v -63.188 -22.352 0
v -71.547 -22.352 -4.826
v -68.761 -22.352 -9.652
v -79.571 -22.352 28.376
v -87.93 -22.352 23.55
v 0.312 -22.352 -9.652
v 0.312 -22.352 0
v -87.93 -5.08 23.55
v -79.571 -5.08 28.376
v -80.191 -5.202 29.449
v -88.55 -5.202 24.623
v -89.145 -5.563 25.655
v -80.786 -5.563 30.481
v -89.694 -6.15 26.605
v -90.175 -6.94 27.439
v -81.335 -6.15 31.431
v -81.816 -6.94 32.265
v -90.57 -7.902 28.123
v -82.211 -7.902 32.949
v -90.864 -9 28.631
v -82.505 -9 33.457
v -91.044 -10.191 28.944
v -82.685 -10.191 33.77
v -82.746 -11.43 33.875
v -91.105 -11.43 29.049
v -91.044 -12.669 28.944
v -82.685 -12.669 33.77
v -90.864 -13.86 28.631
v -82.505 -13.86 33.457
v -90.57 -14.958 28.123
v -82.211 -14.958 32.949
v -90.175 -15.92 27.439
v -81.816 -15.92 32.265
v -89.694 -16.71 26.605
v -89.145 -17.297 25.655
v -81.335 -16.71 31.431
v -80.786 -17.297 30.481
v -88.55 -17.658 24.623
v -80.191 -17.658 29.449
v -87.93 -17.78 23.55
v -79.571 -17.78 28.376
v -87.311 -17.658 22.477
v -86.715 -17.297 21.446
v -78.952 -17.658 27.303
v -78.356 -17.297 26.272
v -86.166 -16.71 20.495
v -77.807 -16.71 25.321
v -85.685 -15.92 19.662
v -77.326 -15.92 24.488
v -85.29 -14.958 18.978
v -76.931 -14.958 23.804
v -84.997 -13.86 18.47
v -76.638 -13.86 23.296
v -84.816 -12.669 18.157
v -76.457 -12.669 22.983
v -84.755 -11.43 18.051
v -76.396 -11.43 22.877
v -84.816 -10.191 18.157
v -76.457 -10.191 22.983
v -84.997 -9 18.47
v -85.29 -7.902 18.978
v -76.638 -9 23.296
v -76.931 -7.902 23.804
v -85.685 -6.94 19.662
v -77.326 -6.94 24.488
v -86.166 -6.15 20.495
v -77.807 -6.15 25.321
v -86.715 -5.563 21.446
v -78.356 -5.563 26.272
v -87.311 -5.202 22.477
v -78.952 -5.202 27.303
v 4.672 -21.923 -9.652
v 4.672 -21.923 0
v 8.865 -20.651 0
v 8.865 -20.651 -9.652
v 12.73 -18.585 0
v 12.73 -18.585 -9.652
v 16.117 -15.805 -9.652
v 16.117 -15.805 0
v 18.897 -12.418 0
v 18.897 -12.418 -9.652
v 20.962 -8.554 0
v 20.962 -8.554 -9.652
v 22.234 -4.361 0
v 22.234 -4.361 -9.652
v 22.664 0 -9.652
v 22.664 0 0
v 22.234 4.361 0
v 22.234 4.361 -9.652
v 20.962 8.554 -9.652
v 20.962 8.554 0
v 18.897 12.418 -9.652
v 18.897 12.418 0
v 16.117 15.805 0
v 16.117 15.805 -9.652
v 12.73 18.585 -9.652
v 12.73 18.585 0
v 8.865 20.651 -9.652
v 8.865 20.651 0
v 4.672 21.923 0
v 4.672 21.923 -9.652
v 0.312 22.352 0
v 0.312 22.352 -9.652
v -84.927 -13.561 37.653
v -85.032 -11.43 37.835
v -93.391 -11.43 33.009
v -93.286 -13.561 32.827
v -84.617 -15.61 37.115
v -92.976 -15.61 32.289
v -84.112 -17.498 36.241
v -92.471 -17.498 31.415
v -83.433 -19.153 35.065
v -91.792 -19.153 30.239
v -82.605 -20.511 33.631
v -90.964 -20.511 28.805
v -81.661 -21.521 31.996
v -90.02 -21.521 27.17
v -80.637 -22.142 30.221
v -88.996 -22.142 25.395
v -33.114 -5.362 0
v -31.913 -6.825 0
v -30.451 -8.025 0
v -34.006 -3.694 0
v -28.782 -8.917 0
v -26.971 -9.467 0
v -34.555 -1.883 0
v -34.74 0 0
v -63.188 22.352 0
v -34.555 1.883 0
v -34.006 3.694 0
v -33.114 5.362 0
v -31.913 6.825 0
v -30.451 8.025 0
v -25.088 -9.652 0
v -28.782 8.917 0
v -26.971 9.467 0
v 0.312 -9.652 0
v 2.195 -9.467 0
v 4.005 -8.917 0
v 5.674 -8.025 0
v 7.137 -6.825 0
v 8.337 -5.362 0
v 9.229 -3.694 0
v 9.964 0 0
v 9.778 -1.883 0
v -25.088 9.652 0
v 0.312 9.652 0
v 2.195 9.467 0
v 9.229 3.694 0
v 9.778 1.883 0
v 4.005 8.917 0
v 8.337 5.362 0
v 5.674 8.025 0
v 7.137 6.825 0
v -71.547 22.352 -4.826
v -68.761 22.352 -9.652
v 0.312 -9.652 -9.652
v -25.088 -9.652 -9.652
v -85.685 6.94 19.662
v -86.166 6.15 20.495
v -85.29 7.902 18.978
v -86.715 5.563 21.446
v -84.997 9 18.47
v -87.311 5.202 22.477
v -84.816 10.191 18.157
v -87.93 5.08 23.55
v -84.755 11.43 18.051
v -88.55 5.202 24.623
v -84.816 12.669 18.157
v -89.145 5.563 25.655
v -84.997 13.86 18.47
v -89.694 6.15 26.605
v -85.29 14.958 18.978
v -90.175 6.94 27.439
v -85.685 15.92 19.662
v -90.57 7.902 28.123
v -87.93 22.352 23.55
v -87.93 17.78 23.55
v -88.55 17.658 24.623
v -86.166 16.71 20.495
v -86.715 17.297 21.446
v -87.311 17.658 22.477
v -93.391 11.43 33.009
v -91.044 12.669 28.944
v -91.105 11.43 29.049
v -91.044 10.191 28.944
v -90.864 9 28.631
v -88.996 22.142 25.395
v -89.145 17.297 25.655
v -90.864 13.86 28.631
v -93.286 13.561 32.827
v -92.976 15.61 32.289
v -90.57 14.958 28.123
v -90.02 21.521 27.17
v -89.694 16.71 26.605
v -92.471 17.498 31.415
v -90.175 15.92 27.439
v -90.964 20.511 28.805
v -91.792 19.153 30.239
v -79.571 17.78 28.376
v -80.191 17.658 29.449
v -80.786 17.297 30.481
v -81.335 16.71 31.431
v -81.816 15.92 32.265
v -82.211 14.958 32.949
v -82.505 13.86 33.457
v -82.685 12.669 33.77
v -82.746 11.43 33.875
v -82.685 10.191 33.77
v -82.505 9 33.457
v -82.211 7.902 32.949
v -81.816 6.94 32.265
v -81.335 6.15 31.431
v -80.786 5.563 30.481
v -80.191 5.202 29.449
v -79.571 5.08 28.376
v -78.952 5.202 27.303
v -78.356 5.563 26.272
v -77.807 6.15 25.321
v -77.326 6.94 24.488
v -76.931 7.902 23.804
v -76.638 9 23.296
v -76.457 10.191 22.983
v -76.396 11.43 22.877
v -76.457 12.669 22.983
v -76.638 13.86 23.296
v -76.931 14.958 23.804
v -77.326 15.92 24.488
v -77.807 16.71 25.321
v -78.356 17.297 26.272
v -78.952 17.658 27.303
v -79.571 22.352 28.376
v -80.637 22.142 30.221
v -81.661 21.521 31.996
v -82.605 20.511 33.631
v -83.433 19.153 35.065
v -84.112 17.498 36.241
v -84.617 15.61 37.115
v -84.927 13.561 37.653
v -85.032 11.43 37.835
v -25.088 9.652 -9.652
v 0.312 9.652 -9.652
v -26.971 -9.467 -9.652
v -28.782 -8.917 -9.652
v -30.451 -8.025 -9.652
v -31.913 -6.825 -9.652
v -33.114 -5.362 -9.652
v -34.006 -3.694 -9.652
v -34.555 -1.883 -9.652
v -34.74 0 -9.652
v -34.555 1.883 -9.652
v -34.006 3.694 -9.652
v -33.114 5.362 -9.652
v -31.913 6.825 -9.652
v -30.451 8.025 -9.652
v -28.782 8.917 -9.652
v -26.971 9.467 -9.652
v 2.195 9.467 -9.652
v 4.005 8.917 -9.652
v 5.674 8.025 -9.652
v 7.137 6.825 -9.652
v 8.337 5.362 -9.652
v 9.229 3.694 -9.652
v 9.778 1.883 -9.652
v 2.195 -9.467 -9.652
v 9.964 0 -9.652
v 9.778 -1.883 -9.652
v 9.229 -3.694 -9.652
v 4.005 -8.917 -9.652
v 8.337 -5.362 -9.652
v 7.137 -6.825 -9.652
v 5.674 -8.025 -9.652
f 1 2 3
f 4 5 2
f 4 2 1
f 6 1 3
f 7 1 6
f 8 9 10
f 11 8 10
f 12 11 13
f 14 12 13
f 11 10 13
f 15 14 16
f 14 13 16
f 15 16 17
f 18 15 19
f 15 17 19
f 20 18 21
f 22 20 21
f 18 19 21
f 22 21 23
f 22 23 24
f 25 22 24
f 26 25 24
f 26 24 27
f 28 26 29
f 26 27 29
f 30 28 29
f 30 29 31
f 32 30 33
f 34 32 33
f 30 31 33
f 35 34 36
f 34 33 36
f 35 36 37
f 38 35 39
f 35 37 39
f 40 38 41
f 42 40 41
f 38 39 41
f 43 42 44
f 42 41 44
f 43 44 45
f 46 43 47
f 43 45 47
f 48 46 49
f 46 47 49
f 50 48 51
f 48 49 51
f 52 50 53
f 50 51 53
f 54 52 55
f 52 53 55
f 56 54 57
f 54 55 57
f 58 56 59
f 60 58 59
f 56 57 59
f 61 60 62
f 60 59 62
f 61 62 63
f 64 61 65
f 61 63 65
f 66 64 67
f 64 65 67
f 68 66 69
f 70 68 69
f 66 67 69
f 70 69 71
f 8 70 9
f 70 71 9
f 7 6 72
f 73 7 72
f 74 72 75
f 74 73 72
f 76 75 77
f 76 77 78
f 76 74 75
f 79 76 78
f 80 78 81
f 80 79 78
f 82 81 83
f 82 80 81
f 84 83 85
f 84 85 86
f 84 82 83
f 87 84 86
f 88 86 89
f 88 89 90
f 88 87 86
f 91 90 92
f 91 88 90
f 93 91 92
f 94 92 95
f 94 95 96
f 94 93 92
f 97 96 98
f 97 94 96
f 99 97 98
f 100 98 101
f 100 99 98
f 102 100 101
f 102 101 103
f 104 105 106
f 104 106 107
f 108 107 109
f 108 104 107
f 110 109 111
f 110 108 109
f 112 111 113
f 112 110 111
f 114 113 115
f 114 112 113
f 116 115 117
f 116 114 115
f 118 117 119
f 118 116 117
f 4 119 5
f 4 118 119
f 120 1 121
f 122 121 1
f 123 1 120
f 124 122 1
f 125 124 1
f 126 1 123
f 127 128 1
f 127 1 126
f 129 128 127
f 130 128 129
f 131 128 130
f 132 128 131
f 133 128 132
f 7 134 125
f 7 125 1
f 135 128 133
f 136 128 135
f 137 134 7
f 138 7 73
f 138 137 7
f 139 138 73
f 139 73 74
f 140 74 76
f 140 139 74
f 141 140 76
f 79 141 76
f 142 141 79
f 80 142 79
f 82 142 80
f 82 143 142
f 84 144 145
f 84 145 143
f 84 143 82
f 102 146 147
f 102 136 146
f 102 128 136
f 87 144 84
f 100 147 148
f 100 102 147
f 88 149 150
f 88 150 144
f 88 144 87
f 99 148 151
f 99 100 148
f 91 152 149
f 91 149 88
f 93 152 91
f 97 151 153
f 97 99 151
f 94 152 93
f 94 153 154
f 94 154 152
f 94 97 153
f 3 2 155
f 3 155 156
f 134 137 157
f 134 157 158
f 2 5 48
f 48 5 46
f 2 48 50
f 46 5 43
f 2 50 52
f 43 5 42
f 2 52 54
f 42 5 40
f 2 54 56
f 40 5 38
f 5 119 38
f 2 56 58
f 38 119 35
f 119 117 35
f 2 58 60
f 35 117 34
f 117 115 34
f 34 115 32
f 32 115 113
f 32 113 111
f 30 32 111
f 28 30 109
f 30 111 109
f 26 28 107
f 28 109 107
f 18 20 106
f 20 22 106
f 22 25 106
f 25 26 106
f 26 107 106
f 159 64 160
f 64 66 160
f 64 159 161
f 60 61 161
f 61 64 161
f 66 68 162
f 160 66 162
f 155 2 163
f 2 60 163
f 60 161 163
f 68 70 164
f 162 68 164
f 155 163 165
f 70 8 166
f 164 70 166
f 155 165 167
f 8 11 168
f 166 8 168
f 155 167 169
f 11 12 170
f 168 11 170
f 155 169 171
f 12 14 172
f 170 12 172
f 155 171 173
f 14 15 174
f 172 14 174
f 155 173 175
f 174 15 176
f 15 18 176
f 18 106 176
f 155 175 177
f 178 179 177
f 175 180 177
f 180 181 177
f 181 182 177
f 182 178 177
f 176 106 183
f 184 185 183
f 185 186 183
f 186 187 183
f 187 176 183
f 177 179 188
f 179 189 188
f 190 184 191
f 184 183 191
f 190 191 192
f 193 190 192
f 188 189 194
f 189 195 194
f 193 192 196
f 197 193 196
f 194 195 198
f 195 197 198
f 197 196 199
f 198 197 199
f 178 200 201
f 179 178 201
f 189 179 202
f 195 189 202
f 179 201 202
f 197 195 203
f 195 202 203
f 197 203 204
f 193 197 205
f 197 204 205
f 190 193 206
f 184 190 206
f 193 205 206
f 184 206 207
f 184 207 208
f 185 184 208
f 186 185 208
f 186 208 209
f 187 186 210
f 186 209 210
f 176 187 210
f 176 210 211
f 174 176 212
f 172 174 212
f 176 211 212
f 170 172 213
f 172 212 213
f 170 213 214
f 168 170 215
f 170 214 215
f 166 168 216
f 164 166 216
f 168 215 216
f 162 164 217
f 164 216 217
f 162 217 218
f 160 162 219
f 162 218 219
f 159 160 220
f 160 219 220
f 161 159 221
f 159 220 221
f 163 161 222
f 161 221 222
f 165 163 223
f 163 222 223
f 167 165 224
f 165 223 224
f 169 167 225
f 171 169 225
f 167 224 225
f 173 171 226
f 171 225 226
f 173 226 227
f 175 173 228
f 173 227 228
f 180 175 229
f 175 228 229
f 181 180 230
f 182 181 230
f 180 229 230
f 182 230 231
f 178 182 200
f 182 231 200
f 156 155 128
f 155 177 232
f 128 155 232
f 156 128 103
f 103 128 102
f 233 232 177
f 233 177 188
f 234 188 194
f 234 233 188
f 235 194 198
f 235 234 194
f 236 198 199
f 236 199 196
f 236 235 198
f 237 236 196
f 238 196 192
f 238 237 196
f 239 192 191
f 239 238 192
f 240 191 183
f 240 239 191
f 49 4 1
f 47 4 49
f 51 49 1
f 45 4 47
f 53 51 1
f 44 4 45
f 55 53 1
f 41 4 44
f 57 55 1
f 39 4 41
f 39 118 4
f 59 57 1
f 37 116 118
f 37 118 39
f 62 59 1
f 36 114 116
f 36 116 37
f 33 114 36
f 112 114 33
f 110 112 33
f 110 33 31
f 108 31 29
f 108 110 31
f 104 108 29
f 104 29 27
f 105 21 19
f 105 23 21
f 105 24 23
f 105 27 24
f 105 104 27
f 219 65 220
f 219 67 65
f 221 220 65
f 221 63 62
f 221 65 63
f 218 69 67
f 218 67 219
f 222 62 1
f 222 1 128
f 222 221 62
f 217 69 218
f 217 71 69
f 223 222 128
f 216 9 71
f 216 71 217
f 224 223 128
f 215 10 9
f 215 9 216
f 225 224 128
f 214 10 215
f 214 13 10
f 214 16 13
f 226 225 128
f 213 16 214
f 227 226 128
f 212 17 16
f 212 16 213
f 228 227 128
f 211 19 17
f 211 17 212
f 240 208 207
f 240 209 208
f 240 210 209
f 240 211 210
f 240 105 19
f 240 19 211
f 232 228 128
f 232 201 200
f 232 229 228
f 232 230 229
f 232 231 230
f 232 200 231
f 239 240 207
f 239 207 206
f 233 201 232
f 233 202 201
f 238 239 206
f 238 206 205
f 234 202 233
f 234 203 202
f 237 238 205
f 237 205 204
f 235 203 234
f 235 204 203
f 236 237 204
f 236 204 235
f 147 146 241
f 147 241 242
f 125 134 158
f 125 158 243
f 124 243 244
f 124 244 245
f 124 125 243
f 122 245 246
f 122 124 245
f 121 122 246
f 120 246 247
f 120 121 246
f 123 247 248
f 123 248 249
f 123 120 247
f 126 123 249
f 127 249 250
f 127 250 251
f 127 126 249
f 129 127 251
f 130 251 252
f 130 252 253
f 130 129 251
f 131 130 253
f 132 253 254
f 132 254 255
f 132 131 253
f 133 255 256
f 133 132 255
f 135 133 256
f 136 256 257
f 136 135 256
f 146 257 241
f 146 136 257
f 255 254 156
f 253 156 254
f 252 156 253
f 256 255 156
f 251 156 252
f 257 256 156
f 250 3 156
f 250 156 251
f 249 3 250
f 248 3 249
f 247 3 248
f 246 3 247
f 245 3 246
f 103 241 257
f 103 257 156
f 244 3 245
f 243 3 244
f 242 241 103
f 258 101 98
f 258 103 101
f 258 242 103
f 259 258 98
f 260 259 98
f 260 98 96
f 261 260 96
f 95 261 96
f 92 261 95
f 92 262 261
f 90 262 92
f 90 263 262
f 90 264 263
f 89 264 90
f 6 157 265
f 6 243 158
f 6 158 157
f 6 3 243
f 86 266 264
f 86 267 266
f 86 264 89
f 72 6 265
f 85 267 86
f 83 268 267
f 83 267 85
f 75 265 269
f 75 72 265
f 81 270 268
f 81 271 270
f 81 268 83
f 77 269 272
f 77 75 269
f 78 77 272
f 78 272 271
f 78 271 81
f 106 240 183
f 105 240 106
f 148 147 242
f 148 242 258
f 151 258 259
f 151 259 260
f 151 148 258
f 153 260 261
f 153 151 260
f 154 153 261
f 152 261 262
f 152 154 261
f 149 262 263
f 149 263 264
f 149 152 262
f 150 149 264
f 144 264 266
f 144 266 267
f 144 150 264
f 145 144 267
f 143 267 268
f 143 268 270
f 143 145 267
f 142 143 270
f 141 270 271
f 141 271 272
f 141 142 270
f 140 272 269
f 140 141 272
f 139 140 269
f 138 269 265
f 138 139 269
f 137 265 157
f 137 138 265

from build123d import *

# Parameters (mm, degrees)
F2_R     = 6.35
F3_DEPTH = 9.652
F4_DEPTH = 9.652
F6_DEPTH = 44.704


with BuildPart() as f3:
    # F2 (on face) → F3 (new body)
    with BuildSketch(Plane(origin=(-47.391302, 0, -27.361381), x_dir=(0, 1, 0), z_dir=(0.866025, 0, 0.5))):
        with BuildLine():
            Line((-22.352, 64.360201), (-22.352, 31.594201))
            Line((-22.352, 31.594201), (22.352, 31.594201))
            Line((22.352, 31.594201), (22.352, 64.360201))
            ThreePointArc((22.352, 64.360201), (19.15302, 72.083222), (11.43, 75.282201))
            Line((11.43, 75.282201), (-11.43, 75.282201))
            ThreePointArc((-11.43, 75.282201), (-19.15302, 72.083222), (-22.352, 64.360201))
        make_face()
        with Locations((-11.43, 64.360201)):
            Circle(F2_R, mode=Mode.SUBTRACT)
        with Locations((11.43, 64.360201)):
            Circle(F2_R, mode=Mode.SUBTRACT)
    extrude(amount=-F3_DEPTH)



with BuildPart() as f4:
    # F0 (on Top) → F4 (new body)
    with BuildSketch(Plane.XY):
        with BuildLine():
            Line((-63.188403, -22.352), (0.311597, -22.352))
            ThreePointArc((0.311597, -22.352), (22.663597, 0), (0.311597, 22.352))
            Line((0.311597, 22.352), (-63.188403, 22.352))
            Line((-63.188403, 22.352), (-63.188403, -22.352))
        make_face()
        with BuildLine():
            ThreePointArc((0.311597, 9.652), (9.963597, 0), (0.311597, -9.652))
            Line((0.311597, -9.652), (-25.088403, -9.652))
            ThreePointArc((-25.088403, -9.652), (-34.740403, 0), (-25.088403, 9.652))
            Line((-25.088403, 9.652), (0.311597, 9.652))
        make_face(mode=Mode.SUBTRACT)
    extrude(amount=-F4_DEPTH)


with BuildPart() as f3_1:
    add(f3.part)

    add(f4.part)  # F6 merges F4
    # F5 (on face) → F6 (join)
    with BuildSketch(Plane.XZ.offset(22.352)):
        Polygon((-63.188403, 0), (-71.54728, -4.826), (-68.760988, -9.652), (-63.188403, -9.652), align=None)
    extrude(amount=-F6_DEPTH)


solid = f3_1.part
